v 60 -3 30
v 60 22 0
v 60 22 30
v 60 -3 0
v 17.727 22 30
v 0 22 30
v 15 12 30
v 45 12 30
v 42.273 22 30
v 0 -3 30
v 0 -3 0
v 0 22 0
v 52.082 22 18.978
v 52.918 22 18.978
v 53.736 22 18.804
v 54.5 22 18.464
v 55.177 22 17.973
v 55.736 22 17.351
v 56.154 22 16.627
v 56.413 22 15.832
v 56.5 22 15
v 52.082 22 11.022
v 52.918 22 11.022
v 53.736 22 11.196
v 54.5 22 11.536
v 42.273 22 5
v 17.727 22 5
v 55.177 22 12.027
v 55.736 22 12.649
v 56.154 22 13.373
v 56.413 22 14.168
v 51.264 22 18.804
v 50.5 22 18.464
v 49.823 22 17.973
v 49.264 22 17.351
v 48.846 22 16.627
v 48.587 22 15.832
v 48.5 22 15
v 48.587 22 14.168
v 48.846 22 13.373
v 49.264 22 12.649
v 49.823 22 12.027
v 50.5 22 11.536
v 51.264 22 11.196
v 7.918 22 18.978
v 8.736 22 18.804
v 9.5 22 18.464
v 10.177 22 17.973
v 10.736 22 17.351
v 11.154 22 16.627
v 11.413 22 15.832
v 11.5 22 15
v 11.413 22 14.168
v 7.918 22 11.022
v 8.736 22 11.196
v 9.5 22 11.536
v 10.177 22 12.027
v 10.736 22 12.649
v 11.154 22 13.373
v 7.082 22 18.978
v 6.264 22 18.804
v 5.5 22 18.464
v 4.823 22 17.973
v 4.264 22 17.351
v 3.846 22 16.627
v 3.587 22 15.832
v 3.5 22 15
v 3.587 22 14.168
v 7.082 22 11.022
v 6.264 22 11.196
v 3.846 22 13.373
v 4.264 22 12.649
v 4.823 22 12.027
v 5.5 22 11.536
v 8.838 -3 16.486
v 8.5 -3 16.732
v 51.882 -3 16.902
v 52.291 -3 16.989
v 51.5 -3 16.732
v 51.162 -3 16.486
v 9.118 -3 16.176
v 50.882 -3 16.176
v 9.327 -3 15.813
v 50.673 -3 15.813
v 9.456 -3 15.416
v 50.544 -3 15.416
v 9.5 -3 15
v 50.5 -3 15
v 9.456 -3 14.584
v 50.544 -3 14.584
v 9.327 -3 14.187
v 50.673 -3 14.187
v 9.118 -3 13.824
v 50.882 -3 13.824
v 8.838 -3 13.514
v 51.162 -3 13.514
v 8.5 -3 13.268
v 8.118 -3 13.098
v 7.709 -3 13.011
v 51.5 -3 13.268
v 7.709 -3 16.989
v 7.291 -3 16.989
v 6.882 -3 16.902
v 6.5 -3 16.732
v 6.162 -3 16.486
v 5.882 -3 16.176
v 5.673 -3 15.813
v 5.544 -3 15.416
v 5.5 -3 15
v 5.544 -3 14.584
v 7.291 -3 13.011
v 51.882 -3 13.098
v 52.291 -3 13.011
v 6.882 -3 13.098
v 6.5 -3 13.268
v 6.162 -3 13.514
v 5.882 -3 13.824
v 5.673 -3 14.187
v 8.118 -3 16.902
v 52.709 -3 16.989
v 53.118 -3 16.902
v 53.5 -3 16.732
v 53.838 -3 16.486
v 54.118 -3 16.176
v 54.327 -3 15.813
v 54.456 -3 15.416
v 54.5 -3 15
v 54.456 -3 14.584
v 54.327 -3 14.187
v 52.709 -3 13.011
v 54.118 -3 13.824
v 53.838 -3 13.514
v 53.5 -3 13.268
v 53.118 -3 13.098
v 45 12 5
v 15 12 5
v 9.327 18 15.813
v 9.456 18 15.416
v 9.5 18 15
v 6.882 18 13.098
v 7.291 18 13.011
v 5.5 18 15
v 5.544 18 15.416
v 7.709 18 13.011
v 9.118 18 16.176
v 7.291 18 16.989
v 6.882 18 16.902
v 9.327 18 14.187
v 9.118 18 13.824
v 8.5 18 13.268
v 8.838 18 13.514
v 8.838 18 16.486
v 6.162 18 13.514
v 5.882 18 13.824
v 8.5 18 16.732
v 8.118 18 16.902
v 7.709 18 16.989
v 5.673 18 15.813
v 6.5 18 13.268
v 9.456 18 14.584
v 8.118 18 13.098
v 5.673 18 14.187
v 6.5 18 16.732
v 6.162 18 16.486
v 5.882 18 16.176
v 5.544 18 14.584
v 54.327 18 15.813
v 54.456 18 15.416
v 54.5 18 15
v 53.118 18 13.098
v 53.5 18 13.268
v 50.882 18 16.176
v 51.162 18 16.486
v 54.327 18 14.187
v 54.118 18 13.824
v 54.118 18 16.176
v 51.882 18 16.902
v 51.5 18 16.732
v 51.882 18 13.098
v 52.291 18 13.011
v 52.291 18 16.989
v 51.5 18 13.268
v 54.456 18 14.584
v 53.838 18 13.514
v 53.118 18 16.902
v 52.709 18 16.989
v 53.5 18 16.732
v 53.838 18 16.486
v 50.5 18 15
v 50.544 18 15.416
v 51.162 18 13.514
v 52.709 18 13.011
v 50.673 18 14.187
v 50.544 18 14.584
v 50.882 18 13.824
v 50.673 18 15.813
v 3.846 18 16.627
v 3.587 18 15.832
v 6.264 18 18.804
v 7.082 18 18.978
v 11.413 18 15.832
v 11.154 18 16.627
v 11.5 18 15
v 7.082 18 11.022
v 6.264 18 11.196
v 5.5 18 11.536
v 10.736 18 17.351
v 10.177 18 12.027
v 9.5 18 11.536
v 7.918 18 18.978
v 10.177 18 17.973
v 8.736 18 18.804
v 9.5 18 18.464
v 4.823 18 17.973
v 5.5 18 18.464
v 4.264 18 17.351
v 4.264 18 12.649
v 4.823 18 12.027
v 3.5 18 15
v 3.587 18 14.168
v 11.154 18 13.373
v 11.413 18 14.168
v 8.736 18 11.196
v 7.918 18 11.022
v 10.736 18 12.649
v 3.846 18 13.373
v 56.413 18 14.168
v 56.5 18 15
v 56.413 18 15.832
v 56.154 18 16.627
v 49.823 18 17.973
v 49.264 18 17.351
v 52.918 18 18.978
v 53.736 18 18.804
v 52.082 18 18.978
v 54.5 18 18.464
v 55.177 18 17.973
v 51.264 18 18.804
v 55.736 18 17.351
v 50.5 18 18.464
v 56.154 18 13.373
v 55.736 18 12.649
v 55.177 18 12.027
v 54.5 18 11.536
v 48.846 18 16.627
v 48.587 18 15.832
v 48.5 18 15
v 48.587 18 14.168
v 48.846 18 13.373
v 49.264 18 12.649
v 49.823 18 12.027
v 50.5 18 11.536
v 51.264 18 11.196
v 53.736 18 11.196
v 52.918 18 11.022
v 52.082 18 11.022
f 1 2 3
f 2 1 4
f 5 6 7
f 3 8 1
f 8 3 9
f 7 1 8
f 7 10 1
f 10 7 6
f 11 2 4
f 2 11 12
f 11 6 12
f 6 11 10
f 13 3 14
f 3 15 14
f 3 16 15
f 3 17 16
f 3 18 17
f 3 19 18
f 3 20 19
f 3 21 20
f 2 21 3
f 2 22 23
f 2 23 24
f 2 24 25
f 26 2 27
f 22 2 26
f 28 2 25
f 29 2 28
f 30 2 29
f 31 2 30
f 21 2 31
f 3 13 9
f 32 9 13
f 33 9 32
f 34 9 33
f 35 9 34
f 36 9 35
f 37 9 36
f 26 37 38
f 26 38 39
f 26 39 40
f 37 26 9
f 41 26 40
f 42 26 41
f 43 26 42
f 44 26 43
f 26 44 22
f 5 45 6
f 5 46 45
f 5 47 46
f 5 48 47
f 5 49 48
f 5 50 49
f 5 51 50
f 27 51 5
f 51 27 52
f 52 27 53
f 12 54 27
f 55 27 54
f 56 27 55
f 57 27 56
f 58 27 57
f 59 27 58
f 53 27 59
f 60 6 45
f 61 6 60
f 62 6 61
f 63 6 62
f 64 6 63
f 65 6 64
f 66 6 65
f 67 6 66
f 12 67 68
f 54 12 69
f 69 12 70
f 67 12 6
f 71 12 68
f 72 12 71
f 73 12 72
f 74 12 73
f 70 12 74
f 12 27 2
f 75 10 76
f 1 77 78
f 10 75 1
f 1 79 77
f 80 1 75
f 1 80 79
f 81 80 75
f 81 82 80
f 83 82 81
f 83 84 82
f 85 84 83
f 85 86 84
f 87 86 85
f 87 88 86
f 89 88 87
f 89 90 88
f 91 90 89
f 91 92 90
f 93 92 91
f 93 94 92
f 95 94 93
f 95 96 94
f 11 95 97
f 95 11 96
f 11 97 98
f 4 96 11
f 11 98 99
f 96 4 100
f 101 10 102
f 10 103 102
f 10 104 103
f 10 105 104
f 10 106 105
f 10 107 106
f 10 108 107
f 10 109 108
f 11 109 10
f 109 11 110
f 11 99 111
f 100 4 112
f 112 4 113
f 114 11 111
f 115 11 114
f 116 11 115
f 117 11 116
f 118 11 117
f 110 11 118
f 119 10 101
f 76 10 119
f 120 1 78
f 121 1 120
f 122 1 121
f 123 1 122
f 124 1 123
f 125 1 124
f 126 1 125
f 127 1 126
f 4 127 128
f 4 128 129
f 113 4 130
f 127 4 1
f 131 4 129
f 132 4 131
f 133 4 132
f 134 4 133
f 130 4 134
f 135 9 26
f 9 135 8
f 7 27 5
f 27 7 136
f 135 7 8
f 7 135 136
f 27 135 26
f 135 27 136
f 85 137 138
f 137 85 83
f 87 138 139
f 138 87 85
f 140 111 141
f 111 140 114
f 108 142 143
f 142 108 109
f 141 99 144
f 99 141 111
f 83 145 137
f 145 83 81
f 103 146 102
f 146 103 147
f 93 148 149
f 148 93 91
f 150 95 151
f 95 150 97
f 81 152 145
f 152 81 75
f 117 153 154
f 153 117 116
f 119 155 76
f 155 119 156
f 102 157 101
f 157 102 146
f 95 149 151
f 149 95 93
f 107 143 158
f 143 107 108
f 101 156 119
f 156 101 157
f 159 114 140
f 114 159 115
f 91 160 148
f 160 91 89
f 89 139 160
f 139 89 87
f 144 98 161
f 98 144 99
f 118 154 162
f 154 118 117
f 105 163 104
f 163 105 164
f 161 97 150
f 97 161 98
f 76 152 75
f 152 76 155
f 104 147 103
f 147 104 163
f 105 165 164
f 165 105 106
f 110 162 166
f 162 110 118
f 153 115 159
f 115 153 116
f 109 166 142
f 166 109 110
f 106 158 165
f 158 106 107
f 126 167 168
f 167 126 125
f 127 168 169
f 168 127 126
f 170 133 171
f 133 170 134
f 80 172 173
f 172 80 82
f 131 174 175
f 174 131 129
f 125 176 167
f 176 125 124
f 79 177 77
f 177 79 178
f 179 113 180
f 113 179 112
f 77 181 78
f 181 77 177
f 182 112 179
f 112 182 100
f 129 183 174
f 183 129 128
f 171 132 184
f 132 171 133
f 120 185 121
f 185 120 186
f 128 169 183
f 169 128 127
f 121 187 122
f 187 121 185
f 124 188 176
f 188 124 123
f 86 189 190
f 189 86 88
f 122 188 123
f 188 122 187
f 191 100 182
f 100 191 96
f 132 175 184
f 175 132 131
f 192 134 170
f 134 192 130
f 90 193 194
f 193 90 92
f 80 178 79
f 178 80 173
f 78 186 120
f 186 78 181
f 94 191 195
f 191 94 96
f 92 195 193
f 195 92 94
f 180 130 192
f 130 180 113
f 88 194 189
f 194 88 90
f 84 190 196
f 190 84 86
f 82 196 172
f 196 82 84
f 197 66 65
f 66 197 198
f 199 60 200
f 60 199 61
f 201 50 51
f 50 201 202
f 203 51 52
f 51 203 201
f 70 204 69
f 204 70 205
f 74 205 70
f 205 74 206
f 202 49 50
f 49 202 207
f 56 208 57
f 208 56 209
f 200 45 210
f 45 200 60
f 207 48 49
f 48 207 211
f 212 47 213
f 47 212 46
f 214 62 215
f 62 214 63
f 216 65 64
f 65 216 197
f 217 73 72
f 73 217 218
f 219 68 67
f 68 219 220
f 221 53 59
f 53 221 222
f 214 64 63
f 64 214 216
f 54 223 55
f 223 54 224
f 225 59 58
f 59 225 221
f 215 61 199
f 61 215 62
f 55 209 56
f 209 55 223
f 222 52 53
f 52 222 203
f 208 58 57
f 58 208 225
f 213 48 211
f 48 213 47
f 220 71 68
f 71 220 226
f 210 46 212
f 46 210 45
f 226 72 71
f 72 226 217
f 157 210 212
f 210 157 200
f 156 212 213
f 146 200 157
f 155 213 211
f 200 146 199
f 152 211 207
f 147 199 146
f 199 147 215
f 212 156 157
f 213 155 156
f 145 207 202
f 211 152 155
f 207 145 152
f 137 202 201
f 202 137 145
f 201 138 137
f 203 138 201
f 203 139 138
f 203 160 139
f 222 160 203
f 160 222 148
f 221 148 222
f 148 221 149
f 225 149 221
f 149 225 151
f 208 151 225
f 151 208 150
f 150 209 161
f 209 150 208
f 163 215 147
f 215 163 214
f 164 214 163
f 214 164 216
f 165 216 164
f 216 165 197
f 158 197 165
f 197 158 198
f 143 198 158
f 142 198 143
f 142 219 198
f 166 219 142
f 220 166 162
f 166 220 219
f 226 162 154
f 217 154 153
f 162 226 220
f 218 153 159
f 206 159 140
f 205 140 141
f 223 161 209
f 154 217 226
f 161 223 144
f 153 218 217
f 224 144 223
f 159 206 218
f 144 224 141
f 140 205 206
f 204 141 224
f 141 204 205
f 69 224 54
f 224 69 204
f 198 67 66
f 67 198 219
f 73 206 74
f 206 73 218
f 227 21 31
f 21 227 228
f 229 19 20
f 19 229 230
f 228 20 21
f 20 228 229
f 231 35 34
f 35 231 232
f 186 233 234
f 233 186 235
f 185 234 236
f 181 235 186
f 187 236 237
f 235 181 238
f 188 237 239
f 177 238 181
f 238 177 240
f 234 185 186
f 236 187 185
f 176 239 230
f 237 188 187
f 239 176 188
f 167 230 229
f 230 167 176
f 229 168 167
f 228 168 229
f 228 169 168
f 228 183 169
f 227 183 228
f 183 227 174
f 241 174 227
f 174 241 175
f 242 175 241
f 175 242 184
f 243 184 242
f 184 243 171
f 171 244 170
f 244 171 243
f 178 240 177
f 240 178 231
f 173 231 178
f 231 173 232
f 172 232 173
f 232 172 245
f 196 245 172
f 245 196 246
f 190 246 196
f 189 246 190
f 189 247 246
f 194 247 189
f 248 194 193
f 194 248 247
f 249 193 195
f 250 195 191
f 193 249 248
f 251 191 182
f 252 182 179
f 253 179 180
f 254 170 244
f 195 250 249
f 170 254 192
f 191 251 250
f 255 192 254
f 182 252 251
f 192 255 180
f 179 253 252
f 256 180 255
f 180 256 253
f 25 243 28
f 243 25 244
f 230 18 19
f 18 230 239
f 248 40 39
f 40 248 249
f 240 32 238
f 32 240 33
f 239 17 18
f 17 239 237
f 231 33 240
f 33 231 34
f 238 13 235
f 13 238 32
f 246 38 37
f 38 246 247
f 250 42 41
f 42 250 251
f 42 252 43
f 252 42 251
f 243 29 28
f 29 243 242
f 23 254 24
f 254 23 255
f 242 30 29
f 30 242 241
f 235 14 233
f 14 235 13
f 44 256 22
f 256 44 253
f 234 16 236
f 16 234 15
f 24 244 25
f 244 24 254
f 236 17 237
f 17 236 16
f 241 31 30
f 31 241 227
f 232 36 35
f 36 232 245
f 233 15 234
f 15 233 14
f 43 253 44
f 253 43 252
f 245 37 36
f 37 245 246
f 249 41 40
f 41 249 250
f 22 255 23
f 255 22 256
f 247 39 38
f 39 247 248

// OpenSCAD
h = 30;
off = 15;
folga = 1;

trap_dif = 3;
trap_h = 10;
trap_l = 30;

paraf_r= 2;
paraf_h= 5;

translate([off, off*.8, 0]){


difference(){
translate([-off, -off,0])cube([trap_l + 2*off,trap_h + off,h]);
translate([0,0,5]
)linear_extrude(height = h + 5, center = false, convexity = 10) polygon(points=[[0,0],[trap_dif,trap_h + 1],[trap_l-trap_dif,trap_h + 1],[trap_l,0]]);

translate([-off/2,50,h/2]) rotate([90,0,0]) cylinder(r=paraf_r, h=200, $fn=30);
translate([trap_l + off/2,50,h/2]) rotate([90,0,0]) cylinder(r=paraf_r, h=200, $fn=30);

translate([-off/2,trap_h + 1,h/2]) rotate([90,0,0]) cylinder(r=paraf_r*2, h=paraf_h, $fn=30);
translate([trap_l + off/2,trap_h + 1,h/2]) rotate([90,0,0]) cylinder(r=paraf_r*2, h=paraf_h, $fn=30);

}
/*

difference(){
union(){
translate([-off, trap_h + folga,0])cube([trap_l + 2*off,trap_h + off*.5,h]);
translate([0,0,5]
)linear_extrude(height = h - 5, center = false, convexity = 10) polygon(points=[[folga,folga],[trap_dif + folga,trap_h + 1],[trap_l-trap_dif - folga,trap_h + 1],[trap_l - folga, + folga]]);
}

translate([-off/2,50,h/2]) rotate([90,0,0]) cylinder(r=paraf_r, h=200, $fn=30);
translate([trap_l + off/2,50,h/2]) rotate([90,0,0]) cylinder(r=paraf_r, h=200, $fn=30);

translate([-off/2, trap_h + folga + paraf_h-1,h/2]) rotate([90,0,0]) cylinder(r=paraf_r*2,  h=paraf_h, $fn=30);
translate([trap_l + off/2,trap_h + folga + paraf_h-1,h/2]) rotate([90,0,0]) cylinder(r=paraf_r*2, h=paraf_h, $fn=30);

}
*/
}
